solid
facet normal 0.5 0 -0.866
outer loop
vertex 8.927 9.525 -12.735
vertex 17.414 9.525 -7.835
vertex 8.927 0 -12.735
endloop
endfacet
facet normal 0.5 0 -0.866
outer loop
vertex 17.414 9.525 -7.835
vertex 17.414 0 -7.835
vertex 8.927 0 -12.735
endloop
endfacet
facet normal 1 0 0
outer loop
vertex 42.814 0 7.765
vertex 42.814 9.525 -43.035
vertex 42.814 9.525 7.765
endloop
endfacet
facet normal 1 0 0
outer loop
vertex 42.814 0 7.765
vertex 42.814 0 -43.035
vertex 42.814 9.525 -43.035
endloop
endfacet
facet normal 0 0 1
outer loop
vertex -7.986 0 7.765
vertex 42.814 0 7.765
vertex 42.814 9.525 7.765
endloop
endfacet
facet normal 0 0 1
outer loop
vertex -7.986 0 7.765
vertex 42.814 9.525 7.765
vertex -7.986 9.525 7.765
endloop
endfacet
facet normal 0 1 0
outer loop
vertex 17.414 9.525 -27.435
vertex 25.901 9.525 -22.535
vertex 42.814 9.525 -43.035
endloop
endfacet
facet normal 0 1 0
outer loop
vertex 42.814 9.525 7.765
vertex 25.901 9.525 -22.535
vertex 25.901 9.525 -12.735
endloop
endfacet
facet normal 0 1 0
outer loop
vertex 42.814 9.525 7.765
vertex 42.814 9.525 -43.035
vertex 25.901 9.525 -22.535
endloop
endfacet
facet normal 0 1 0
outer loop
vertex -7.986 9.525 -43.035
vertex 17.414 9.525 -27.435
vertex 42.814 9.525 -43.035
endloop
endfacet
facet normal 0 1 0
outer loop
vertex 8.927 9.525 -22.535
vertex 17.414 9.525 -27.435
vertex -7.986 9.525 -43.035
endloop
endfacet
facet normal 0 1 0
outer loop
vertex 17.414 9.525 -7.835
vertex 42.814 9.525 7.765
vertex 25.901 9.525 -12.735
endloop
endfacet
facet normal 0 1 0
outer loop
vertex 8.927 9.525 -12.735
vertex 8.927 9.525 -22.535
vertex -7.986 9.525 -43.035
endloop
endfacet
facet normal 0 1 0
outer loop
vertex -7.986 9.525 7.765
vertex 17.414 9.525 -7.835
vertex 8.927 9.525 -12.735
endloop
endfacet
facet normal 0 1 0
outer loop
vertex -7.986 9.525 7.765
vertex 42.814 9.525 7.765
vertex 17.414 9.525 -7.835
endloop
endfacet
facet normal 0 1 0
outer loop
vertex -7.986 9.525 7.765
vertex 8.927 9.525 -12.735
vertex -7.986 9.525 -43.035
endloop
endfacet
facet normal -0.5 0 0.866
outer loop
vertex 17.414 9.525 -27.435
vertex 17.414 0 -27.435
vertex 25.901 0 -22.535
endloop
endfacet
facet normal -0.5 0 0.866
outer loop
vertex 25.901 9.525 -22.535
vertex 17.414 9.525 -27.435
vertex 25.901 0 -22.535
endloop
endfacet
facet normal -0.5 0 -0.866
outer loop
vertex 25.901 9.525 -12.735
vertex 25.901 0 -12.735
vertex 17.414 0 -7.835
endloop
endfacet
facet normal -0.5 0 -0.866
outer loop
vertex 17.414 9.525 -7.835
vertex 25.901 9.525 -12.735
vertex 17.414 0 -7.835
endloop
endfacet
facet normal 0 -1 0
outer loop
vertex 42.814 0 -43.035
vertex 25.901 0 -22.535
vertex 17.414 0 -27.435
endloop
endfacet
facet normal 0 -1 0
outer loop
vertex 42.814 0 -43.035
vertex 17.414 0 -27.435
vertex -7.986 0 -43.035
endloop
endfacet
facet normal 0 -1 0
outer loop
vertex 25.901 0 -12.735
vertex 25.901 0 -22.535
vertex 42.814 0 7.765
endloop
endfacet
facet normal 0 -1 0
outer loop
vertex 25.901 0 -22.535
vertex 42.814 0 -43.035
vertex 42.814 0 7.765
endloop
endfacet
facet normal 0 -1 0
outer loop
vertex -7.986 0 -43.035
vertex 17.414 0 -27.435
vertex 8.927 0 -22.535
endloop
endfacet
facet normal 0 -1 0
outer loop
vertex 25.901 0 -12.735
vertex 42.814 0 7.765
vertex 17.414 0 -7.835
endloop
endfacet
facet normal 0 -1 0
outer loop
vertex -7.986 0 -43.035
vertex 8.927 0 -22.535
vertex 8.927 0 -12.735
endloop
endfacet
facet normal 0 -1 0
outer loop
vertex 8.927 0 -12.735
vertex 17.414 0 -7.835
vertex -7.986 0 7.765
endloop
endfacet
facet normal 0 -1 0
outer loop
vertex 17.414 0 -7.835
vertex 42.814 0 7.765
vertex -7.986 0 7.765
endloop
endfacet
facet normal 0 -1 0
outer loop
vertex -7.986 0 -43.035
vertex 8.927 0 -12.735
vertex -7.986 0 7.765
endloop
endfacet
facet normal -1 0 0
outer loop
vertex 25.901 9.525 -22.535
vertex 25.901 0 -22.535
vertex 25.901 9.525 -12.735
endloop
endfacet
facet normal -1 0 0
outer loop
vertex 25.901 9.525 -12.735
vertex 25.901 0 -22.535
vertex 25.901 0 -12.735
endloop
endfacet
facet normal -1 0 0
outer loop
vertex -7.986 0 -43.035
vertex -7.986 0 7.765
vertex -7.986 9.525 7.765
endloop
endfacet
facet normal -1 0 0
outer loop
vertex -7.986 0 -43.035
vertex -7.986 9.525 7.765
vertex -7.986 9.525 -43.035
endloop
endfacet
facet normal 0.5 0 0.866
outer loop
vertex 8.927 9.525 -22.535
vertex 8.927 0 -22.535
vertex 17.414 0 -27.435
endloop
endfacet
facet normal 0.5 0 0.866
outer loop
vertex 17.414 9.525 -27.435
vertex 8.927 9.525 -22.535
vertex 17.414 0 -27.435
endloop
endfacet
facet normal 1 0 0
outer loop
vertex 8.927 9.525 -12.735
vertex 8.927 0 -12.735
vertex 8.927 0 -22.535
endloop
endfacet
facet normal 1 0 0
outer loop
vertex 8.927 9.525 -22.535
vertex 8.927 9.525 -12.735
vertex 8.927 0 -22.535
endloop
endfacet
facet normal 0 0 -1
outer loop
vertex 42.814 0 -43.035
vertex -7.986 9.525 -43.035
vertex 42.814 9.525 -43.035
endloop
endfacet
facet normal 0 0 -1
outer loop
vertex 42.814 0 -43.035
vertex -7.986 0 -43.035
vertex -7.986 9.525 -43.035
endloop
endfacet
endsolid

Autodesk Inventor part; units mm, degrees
ref_plane "YZ Plane" through (0, 0, 0) normal (1, 0, 0) x (0, 1, 0)
ref_plane "XZ Plane" through (0, 0, 0) normal (0, 1, 0) x (-1, 0, 0)
ref_plane "XY Plane" through (0, 0, 0) normal (0, 0, 1) x (1, 0, 0)
sketch "Sketch1" plane through (0, 0, 0) normal (0, 1, 0) x (-1, 0, 0)
  line L0 (7.9861, 7.7649) -> (7.9861, -43.0351)
  line L1 (7.9861, -43.0351) -> (-42.8139, -43.0351)
  line L2 (-42.8139, -43.0351) -> (-42.8139, 7.7649)
  line L3 (-42.8139, 7.7649) -> (7.9861, 7.7649)
  line L4 (-17.4139, -27.4351) -> (-25.901, -22.5351)
  line L5 (-25.901, -22.5351) -> (-25.901, -12.7351)
  line L6 (-25.901, -12.7351) -> (-17.4139, -7.8351)
  line L7 (-17.4139, -7.8351) -> (-8.9269, -12.7351)
  line L8 (-8.9269, -12.7351) -> (-8.9269, -22.5351)
  line L9 (-8.9269, -22.5351) -> (-17.4139, -27.4351)
  point P0 (0, 0)
  point P1 (-17.4139, -17.6351)
  point P2 (-21.6575, -24.9851)
  point P3 (-13.1704, -10.2851)
  dimension "d0" = 50.8
  dimension "d1" = 50.8
  dimension "d2" = 14.7
extrude "Extrusion1" add sketch "Sketch1" along normal blind 9.525
properties part number "Hex Box +2mm"
